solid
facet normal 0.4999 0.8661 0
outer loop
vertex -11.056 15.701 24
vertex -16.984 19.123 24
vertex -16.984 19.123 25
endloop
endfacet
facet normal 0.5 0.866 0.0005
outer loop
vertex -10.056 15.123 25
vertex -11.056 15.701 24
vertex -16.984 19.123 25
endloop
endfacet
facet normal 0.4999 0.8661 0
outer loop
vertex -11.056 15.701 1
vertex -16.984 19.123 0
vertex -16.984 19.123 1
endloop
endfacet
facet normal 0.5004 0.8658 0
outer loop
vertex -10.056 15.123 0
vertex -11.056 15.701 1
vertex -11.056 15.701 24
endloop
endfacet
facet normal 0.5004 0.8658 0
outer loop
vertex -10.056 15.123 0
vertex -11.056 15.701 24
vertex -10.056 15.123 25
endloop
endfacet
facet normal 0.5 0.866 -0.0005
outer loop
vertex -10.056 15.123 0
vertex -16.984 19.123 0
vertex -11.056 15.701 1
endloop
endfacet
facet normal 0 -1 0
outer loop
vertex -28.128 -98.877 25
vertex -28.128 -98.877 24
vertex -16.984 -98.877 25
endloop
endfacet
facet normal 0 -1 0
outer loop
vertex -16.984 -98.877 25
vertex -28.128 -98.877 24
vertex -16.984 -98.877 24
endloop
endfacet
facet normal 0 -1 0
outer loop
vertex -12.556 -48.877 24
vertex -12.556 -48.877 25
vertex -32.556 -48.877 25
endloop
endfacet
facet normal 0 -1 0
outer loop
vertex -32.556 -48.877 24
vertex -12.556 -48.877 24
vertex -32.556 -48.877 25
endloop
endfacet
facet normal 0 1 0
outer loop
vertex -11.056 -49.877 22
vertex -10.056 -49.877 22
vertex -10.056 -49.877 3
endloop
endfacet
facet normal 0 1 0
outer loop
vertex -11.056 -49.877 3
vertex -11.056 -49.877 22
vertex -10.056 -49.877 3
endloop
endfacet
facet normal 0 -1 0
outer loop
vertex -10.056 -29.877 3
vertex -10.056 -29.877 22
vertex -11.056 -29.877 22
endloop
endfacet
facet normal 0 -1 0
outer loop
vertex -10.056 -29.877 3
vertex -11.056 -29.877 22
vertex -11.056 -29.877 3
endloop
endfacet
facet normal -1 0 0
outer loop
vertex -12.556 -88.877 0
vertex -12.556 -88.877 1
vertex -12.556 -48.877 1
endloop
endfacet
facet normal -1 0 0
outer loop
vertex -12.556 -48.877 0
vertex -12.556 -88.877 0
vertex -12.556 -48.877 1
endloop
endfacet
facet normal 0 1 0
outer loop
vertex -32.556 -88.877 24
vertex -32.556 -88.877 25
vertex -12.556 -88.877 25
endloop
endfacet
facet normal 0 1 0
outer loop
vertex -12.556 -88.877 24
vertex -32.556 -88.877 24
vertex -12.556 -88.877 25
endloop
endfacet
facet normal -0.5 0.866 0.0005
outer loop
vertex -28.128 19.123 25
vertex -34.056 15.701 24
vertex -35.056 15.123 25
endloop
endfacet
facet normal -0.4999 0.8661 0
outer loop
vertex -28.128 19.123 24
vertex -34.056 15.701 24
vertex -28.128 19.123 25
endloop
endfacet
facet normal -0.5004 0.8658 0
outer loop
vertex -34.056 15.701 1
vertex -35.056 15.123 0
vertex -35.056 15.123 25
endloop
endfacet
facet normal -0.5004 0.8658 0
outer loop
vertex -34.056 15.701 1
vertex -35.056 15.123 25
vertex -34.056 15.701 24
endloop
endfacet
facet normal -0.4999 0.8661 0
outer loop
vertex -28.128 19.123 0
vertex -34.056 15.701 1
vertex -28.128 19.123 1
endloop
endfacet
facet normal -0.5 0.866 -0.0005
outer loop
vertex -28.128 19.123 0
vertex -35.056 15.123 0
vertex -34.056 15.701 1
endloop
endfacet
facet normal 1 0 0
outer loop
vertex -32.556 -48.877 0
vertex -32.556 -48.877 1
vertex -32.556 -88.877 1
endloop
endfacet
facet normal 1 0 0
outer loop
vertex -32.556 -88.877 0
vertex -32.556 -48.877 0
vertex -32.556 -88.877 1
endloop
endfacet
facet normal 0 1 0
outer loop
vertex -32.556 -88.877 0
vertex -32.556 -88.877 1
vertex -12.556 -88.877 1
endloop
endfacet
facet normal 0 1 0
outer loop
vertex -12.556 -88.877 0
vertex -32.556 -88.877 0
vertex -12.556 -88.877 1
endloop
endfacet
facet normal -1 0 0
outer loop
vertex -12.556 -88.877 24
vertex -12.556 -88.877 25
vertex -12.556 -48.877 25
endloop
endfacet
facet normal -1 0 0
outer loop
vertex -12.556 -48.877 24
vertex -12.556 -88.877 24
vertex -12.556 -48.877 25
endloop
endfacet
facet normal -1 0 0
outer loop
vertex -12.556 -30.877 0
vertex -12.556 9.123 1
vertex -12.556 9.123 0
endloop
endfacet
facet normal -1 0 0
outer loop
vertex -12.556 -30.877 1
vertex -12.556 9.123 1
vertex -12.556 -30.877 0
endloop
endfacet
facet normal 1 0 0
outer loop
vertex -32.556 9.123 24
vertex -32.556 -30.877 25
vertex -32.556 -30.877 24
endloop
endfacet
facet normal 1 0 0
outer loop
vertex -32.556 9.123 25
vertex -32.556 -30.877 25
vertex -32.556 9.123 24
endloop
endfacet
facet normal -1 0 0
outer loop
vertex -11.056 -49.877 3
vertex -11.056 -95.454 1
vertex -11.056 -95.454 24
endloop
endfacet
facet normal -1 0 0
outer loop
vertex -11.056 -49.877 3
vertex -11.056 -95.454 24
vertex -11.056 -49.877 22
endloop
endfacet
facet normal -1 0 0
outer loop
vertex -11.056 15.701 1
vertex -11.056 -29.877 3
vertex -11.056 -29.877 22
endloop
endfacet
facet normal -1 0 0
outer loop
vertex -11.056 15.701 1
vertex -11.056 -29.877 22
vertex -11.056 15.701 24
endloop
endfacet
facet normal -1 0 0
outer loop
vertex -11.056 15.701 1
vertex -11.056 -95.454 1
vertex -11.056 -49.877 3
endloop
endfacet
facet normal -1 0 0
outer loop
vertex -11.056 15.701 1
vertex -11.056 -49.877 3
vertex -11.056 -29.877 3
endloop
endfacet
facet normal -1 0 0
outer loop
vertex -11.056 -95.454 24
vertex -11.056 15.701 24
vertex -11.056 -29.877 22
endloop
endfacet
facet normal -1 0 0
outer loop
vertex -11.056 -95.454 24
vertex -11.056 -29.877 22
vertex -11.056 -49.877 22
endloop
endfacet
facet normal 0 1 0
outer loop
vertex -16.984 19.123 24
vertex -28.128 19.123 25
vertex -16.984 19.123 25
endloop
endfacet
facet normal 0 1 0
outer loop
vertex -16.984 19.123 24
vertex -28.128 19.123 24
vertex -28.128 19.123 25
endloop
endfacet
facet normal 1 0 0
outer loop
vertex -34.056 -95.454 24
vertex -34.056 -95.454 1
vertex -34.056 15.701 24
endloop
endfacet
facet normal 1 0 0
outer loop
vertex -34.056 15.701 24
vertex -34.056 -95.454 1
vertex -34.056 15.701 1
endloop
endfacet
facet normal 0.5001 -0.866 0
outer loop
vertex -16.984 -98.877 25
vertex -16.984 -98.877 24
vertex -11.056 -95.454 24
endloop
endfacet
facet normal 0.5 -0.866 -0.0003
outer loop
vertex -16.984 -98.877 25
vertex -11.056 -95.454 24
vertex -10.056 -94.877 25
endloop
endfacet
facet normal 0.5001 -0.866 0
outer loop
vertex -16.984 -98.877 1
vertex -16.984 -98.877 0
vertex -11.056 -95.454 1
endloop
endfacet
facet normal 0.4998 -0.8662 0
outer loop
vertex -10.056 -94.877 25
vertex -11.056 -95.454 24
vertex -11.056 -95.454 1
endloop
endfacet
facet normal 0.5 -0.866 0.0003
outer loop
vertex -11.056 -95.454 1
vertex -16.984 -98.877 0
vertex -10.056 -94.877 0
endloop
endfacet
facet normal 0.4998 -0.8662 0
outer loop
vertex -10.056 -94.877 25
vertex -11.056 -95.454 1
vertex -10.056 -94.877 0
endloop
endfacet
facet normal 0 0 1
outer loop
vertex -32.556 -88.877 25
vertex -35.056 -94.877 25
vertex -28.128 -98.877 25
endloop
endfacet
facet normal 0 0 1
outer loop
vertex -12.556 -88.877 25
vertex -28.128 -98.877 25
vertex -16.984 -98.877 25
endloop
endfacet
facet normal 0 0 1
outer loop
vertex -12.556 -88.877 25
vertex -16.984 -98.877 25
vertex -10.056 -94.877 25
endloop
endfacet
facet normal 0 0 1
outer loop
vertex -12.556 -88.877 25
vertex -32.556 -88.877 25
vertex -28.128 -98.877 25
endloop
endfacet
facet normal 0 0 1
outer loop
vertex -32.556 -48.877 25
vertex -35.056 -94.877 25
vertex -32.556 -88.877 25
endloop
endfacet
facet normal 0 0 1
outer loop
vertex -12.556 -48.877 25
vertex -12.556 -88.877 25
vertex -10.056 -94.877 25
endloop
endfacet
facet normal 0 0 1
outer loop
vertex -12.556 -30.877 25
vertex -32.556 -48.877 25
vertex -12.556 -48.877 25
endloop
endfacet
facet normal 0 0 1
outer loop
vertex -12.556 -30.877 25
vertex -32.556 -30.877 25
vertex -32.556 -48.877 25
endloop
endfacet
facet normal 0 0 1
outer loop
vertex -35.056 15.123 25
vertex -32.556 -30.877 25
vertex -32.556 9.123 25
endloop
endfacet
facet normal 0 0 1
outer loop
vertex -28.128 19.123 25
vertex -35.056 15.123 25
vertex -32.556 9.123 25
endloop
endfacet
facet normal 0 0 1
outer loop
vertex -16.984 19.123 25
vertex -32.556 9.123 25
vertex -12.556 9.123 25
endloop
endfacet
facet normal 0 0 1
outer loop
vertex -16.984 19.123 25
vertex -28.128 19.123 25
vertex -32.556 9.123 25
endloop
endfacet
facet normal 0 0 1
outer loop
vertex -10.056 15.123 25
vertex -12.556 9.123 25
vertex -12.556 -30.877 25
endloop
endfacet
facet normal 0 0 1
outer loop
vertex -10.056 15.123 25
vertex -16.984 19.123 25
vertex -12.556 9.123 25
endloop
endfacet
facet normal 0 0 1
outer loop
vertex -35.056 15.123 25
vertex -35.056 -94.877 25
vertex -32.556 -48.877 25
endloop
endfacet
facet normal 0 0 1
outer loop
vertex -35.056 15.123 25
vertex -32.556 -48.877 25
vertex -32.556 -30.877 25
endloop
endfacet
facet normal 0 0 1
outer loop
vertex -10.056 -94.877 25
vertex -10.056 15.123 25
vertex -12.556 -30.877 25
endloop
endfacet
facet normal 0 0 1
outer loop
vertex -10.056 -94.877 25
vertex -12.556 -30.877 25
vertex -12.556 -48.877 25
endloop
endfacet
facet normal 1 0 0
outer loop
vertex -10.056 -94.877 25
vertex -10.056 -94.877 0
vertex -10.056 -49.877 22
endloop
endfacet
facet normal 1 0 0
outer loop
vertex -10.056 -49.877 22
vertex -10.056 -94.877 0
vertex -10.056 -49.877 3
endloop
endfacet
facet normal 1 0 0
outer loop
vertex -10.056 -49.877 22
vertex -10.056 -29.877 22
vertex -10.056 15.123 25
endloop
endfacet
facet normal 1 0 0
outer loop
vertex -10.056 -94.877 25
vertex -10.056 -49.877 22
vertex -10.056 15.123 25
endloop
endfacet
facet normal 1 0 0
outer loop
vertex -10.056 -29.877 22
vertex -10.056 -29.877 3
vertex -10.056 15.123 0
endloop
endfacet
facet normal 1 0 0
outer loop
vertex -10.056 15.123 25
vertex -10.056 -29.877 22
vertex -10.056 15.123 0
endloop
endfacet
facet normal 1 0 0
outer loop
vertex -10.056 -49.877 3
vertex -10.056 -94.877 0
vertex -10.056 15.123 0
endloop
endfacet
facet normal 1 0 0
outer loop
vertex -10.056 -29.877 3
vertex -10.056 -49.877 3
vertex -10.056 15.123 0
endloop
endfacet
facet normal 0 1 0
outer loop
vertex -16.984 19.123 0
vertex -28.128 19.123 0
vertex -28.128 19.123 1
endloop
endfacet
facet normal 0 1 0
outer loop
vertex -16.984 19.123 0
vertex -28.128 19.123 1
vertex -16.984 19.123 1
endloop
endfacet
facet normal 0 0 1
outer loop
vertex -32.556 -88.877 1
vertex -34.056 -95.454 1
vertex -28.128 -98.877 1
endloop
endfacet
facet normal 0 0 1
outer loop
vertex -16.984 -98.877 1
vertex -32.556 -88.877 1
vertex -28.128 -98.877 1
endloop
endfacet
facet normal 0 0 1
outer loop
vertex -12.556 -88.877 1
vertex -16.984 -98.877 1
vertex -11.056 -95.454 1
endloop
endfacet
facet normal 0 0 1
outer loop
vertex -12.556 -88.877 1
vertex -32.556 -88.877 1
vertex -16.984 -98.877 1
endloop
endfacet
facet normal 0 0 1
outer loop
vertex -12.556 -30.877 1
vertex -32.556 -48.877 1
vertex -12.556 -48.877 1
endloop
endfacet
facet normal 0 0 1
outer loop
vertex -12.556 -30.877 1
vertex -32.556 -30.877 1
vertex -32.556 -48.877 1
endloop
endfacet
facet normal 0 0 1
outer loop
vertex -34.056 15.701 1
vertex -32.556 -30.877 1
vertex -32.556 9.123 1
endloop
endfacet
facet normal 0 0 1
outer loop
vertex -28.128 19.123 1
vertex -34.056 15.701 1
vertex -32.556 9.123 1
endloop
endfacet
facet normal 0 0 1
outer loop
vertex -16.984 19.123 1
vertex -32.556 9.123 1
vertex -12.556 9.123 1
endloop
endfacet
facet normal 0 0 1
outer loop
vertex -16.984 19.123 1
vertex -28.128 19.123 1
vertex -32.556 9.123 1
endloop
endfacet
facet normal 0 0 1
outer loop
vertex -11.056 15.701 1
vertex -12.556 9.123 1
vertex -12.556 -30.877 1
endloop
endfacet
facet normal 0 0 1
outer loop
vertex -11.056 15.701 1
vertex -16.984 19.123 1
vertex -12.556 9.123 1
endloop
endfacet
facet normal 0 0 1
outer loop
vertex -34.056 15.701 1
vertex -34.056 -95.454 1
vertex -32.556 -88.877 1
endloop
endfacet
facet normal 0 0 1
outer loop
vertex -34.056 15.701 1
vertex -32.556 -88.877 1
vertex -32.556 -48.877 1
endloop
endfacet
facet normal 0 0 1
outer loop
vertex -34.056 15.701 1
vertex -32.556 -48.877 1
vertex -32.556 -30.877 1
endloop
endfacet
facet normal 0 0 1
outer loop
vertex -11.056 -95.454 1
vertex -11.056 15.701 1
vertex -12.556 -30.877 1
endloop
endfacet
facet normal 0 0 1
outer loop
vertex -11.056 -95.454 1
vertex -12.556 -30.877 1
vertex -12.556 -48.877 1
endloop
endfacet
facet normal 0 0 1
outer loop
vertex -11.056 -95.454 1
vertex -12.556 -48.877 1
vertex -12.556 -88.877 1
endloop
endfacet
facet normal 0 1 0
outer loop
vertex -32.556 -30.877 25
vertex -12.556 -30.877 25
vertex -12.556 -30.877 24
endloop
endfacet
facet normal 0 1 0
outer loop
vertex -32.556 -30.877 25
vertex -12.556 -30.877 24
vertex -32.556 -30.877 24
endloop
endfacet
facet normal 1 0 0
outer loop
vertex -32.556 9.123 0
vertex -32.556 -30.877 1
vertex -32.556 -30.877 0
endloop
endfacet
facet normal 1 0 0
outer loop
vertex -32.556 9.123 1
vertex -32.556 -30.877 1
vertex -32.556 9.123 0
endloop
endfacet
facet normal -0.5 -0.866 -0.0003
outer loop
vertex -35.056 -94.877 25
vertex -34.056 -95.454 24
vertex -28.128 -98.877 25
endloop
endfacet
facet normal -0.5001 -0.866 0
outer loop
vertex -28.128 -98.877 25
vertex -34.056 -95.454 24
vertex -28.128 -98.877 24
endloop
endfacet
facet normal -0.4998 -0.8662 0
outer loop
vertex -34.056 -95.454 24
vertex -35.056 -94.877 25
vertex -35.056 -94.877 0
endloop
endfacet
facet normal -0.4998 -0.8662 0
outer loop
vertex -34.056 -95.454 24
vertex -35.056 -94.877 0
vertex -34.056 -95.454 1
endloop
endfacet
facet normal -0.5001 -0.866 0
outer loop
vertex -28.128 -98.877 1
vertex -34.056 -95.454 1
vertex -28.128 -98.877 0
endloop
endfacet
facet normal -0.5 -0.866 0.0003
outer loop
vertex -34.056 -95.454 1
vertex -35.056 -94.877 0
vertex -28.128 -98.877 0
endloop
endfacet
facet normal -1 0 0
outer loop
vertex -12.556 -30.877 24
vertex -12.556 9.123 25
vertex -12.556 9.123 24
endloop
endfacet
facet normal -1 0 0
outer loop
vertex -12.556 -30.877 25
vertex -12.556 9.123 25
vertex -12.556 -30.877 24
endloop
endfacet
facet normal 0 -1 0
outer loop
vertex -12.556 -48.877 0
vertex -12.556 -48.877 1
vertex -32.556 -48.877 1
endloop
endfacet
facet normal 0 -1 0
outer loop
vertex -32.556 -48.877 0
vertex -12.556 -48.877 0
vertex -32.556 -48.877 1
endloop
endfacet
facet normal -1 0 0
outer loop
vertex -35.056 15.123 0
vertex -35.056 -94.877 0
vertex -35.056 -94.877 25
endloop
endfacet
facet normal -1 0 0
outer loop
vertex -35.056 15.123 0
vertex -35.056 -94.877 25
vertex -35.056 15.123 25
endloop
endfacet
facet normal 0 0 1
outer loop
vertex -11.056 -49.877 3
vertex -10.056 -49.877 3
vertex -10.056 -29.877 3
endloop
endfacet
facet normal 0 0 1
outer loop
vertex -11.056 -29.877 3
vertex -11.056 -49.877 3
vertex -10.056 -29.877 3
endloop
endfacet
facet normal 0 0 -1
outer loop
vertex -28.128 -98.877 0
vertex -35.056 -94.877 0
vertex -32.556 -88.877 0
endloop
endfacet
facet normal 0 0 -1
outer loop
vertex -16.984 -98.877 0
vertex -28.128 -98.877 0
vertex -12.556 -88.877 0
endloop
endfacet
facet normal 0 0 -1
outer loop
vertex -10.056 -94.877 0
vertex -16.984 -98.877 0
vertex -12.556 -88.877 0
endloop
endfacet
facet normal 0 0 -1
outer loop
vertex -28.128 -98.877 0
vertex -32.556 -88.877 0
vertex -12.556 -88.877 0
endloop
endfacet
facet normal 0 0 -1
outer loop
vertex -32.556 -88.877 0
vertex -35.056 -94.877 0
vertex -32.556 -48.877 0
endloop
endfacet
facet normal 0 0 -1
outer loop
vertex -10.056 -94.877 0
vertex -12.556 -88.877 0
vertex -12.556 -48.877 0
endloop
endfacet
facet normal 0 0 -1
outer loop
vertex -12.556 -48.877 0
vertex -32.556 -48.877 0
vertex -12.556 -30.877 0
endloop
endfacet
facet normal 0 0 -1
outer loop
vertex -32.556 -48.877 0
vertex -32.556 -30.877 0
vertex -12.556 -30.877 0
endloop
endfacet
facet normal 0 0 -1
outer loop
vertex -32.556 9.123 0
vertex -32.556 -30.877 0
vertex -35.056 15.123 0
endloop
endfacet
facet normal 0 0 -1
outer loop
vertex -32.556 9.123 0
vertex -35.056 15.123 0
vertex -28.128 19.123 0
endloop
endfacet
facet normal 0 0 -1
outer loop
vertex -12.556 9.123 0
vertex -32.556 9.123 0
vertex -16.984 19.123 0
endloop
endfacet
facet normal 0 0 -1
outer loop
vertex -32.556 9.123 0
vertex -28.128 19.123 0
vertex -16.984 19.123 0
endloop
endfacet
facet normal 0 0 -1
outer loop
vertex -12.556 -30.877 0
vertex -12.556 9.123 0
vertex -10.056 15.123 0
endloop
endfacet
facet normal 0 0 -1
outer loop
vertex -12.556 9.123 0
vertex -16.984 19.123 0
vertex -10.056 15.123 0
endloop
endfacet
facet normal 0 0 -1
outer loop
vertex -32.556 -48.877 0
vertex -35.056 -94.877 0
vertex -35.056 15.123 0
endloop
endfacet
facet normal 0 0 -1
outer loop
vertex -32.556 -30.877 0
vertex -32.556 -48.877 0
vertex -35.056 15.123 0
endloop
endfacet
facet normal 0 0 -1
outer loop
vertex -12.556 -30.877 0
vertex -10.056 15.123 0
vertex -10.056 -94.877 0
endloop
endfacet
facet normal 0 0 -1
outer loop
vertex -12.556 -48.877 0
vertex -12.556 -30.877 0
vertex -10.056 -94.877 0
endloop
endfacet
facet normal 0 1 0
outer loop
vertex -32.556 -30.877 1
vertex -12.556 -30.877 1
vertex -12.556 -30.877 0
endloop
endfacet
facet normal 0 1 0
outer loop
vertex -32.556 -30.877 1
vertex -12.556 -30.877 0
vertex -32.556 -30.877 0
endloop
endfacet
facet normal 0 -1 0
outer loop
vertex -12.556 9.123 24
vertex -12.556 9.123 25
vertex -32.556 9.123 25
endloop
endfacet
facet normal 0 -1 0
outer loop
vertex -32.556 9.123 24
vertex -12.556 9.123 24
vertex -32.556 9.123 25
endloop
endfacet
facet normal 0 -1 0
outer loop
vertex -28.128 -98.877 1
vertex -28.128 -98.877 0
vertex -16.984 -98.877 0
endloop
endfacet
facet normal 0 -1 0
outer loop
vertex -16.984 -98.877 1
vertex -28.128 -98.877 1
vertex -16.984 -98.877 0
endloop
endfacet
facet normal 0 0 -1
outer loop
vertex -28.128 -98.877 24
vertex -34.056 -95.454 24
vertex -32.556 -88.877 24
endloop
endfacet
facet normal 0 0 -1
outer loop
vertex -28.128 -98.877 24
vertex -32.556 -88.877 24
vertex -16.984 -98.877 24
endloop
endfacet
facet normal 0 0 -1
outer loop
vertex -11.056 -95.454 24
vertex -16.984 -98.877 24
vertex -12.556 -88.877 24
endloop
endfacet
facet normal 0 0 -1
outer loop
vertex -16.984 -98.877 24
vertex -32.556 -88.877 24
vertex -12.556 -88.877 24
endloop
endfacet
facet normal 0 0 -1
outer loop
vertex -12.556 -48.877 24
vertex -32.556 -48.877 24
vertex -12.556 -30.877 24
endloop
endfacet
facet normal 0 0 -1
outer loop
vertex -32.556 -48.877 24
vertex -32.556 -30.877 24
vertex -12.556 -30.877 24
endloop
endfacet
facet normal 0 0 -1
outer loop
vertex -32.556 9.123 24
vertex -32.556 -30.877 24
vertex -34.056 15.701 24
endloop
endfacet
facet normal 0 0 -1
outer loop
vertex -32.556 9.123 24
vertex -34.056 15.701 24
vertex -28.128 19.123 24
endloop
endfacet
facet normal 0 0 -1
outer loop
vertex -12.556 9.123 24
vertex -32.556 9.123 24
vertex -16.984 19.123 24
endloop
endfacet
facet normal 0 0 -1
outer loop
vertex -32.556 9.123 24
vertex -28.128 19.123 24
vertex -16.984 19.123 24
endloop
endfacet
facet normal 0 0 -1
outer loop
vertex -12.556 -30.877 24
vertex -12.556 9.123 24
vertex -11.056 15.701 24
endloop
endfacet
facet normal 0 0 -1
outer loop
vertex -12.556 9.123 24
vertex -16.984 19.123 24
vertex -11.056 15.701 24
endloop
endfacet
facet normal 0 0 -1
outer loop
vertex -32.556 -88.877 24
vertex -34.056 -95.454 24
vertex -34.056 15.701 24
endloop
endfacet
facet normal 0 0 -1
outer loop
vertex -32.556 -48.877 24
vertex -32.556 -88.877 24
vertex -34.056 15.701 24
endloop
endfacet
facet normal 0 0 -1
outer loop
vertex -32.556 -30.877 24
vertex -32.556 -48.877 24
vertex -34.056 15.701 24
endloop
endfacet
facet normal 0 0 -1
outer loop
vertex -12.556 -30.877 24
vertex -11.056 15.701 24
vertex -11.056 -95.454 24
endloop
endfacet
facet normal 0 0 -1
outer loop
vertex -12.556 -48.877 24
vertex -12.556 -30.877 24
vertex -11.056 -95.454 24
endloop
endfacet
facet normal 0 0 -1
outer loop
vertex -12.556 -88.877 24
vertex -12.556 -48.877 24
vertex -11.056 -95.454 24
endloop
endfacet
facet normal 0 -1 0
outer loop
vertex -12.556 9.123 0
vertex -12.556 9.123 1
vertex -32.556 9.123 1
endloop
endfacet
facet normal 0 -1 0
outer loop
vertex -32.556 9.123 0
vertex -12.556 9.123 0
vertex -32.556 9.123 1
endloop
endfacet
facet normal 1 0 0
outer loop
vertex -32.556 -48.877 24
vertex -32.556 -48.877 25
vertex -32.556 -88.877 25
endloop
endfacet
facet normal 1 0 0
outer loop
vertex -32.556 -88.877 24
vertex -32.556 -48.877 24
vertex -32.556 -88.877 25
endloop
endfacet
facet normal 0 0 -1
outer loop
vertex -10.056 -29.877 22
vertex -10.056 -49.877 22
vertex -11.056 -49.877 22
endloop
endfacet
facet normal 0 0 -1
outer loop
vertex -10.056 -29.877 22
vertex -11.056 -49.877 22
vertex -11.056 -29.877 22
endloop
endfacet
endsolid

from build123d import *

# Parameters (mm, degrees)
CROQUIS1_W              = 25
CROQUIS1_H              = 118
SALIENTE_EXTRUIR1_DEPTH = 25
VACIADO1_T              = -1
CORTAR_EXTRUIR2_DEPTH   = 25
CROQUIS3_W              = 19
CROQUIS3_H              = 20
CORTAR_EXTRUIR3_DEPTH   = 1
CHAFL_N1_SIZE           = 4
CHAFL_N1_SIZE_2         = 6.92820323
CHAFL_N2_SIZE           = 6.92820323
CHAFL_N2_SIZE_2         = 4


with BuildPart() as part:
    # Croquis1 → Saliente-Extruir1 (new body)
    with BuildSketch(Plane.XY):
        with Locations((-22.555898832, -39.876814203)):
            Rectangle(CROQUIS1_W, CROQUIS1_H)
    extrude(amount=SALIENTE_EXTRUIR1_DEPTH)

    # Vaciado1
    vaciado1_openings = [part.faces().sort_by_distance(p)[0] for p in [
        (-22.555898832, -98.876814203, 12.5),
        (-22.555898832, 19.123185797, 12.5),
    ]]
    offset(amount=VACIADO1_T, openings=vaciado1_openings, kind=Kind.INTERSECTION)

    # Croquis2 → Cortar-Extruir2 (cut)
    with BuildSketch(Plane.XY.offset(25)):
        Polygon((-12.555898832, -30.876814203), (-32.555898832, -30.876814203), (-32.555898832, 9.123185797), (-22.555898832, 9.123185797), (-12.555898832, 9.123185797), align=None)
        Polygon((-12.555898832, -88.876814203), (-12.555898832, -48.876814203), (-32.555898832, -48.876814203), (-32.555898832, -88.876814203), (-22.555898832, -88.876814203), align=None)
    extrude(amount=-CORTAR_EXTRUIR2_DEPTH, mode=Mode.SUBTRACT)

    # Croquis3 → Cortar-Extruir3 (cut)
    with BuildSketch(Plane(origin=(-10.055898832, 0, 0), x_dir=(0, 0, -1), z_dir=(1, 0, 0))):
        with Locations((-12.5, -39.876814203)):
            Rectangle(CROQUIS3_W, CROQUIS3_H)
    extrude(amount=-CORTAR_EXTRUIR3_DEPTH, mode=Mode.SUBTRACT)

    # Chaflán1
    # the kernel refuses this chamfer: 6.92820323, 4 mm, written as the material it takes off along each edge
    with BuildSketch(Plane(origin=(-35.055898832, 19.123185797, -17.923855882), x_dir=(0, -1, 0), z_dir=(0, 0, 1))) as chafl_n1_piece_1:
        Polygon((CHAFL_N1_SIZE, 0), (0, CHAFL_N1_SIZE_2), (0, 0), align=None)
    extrude(amount=60.847711765, mode=Mode.SUBTRACT)
    with BuildSketch(Plane(origin=(-10.055898832, 19.123185797, -17.923855882), x_dir=(-1, 0, 0), z_dir=(0, 0, 1))) as chafl_n1_piece_2:
        Polygon((CHAFL_N1_SIZE_2, 0), (0, CHAFL_N1_SIZE), (0, 0), align=None)
    extrude(amount=60.847711765, mode=Mode.SUBTRACT)

    # Chaflán2
    # the kernel refuses this chamfer: 6.92820323, 4 mm, written as the material it takes off along each edge
    with BuildSketch(Plane(origin=(-10.055898832, -98.876814203, -17.923855882), x_dir=(-1, 0, 0), z_dir=(0, 0, 1))) as chafl_n2_piece_1:
        Polygon((CHAFL_N2_SIZE, 0), (0, -CHAFL_N2_SIZE_2), (0, 0), align=None)
    extrude(amount=60.847711765, mode=Mode.SUBTRACT)
    with BuildSketch(Plane(origin=(-35.055898832, -98.876814203, -17.923855882), x_dir=(0, 1, 0), z_dir=(0, 0, 1))) as chafl_n2_piece_2:
        Polygon((CHAFL_N2_SIZE_2, 0), (0, -CHAFL_N2_SIZE), (0, 0), align=None)
    extrude(amount=60.847711765, mode=Mode.SUBTRACT)


solid = part.part
